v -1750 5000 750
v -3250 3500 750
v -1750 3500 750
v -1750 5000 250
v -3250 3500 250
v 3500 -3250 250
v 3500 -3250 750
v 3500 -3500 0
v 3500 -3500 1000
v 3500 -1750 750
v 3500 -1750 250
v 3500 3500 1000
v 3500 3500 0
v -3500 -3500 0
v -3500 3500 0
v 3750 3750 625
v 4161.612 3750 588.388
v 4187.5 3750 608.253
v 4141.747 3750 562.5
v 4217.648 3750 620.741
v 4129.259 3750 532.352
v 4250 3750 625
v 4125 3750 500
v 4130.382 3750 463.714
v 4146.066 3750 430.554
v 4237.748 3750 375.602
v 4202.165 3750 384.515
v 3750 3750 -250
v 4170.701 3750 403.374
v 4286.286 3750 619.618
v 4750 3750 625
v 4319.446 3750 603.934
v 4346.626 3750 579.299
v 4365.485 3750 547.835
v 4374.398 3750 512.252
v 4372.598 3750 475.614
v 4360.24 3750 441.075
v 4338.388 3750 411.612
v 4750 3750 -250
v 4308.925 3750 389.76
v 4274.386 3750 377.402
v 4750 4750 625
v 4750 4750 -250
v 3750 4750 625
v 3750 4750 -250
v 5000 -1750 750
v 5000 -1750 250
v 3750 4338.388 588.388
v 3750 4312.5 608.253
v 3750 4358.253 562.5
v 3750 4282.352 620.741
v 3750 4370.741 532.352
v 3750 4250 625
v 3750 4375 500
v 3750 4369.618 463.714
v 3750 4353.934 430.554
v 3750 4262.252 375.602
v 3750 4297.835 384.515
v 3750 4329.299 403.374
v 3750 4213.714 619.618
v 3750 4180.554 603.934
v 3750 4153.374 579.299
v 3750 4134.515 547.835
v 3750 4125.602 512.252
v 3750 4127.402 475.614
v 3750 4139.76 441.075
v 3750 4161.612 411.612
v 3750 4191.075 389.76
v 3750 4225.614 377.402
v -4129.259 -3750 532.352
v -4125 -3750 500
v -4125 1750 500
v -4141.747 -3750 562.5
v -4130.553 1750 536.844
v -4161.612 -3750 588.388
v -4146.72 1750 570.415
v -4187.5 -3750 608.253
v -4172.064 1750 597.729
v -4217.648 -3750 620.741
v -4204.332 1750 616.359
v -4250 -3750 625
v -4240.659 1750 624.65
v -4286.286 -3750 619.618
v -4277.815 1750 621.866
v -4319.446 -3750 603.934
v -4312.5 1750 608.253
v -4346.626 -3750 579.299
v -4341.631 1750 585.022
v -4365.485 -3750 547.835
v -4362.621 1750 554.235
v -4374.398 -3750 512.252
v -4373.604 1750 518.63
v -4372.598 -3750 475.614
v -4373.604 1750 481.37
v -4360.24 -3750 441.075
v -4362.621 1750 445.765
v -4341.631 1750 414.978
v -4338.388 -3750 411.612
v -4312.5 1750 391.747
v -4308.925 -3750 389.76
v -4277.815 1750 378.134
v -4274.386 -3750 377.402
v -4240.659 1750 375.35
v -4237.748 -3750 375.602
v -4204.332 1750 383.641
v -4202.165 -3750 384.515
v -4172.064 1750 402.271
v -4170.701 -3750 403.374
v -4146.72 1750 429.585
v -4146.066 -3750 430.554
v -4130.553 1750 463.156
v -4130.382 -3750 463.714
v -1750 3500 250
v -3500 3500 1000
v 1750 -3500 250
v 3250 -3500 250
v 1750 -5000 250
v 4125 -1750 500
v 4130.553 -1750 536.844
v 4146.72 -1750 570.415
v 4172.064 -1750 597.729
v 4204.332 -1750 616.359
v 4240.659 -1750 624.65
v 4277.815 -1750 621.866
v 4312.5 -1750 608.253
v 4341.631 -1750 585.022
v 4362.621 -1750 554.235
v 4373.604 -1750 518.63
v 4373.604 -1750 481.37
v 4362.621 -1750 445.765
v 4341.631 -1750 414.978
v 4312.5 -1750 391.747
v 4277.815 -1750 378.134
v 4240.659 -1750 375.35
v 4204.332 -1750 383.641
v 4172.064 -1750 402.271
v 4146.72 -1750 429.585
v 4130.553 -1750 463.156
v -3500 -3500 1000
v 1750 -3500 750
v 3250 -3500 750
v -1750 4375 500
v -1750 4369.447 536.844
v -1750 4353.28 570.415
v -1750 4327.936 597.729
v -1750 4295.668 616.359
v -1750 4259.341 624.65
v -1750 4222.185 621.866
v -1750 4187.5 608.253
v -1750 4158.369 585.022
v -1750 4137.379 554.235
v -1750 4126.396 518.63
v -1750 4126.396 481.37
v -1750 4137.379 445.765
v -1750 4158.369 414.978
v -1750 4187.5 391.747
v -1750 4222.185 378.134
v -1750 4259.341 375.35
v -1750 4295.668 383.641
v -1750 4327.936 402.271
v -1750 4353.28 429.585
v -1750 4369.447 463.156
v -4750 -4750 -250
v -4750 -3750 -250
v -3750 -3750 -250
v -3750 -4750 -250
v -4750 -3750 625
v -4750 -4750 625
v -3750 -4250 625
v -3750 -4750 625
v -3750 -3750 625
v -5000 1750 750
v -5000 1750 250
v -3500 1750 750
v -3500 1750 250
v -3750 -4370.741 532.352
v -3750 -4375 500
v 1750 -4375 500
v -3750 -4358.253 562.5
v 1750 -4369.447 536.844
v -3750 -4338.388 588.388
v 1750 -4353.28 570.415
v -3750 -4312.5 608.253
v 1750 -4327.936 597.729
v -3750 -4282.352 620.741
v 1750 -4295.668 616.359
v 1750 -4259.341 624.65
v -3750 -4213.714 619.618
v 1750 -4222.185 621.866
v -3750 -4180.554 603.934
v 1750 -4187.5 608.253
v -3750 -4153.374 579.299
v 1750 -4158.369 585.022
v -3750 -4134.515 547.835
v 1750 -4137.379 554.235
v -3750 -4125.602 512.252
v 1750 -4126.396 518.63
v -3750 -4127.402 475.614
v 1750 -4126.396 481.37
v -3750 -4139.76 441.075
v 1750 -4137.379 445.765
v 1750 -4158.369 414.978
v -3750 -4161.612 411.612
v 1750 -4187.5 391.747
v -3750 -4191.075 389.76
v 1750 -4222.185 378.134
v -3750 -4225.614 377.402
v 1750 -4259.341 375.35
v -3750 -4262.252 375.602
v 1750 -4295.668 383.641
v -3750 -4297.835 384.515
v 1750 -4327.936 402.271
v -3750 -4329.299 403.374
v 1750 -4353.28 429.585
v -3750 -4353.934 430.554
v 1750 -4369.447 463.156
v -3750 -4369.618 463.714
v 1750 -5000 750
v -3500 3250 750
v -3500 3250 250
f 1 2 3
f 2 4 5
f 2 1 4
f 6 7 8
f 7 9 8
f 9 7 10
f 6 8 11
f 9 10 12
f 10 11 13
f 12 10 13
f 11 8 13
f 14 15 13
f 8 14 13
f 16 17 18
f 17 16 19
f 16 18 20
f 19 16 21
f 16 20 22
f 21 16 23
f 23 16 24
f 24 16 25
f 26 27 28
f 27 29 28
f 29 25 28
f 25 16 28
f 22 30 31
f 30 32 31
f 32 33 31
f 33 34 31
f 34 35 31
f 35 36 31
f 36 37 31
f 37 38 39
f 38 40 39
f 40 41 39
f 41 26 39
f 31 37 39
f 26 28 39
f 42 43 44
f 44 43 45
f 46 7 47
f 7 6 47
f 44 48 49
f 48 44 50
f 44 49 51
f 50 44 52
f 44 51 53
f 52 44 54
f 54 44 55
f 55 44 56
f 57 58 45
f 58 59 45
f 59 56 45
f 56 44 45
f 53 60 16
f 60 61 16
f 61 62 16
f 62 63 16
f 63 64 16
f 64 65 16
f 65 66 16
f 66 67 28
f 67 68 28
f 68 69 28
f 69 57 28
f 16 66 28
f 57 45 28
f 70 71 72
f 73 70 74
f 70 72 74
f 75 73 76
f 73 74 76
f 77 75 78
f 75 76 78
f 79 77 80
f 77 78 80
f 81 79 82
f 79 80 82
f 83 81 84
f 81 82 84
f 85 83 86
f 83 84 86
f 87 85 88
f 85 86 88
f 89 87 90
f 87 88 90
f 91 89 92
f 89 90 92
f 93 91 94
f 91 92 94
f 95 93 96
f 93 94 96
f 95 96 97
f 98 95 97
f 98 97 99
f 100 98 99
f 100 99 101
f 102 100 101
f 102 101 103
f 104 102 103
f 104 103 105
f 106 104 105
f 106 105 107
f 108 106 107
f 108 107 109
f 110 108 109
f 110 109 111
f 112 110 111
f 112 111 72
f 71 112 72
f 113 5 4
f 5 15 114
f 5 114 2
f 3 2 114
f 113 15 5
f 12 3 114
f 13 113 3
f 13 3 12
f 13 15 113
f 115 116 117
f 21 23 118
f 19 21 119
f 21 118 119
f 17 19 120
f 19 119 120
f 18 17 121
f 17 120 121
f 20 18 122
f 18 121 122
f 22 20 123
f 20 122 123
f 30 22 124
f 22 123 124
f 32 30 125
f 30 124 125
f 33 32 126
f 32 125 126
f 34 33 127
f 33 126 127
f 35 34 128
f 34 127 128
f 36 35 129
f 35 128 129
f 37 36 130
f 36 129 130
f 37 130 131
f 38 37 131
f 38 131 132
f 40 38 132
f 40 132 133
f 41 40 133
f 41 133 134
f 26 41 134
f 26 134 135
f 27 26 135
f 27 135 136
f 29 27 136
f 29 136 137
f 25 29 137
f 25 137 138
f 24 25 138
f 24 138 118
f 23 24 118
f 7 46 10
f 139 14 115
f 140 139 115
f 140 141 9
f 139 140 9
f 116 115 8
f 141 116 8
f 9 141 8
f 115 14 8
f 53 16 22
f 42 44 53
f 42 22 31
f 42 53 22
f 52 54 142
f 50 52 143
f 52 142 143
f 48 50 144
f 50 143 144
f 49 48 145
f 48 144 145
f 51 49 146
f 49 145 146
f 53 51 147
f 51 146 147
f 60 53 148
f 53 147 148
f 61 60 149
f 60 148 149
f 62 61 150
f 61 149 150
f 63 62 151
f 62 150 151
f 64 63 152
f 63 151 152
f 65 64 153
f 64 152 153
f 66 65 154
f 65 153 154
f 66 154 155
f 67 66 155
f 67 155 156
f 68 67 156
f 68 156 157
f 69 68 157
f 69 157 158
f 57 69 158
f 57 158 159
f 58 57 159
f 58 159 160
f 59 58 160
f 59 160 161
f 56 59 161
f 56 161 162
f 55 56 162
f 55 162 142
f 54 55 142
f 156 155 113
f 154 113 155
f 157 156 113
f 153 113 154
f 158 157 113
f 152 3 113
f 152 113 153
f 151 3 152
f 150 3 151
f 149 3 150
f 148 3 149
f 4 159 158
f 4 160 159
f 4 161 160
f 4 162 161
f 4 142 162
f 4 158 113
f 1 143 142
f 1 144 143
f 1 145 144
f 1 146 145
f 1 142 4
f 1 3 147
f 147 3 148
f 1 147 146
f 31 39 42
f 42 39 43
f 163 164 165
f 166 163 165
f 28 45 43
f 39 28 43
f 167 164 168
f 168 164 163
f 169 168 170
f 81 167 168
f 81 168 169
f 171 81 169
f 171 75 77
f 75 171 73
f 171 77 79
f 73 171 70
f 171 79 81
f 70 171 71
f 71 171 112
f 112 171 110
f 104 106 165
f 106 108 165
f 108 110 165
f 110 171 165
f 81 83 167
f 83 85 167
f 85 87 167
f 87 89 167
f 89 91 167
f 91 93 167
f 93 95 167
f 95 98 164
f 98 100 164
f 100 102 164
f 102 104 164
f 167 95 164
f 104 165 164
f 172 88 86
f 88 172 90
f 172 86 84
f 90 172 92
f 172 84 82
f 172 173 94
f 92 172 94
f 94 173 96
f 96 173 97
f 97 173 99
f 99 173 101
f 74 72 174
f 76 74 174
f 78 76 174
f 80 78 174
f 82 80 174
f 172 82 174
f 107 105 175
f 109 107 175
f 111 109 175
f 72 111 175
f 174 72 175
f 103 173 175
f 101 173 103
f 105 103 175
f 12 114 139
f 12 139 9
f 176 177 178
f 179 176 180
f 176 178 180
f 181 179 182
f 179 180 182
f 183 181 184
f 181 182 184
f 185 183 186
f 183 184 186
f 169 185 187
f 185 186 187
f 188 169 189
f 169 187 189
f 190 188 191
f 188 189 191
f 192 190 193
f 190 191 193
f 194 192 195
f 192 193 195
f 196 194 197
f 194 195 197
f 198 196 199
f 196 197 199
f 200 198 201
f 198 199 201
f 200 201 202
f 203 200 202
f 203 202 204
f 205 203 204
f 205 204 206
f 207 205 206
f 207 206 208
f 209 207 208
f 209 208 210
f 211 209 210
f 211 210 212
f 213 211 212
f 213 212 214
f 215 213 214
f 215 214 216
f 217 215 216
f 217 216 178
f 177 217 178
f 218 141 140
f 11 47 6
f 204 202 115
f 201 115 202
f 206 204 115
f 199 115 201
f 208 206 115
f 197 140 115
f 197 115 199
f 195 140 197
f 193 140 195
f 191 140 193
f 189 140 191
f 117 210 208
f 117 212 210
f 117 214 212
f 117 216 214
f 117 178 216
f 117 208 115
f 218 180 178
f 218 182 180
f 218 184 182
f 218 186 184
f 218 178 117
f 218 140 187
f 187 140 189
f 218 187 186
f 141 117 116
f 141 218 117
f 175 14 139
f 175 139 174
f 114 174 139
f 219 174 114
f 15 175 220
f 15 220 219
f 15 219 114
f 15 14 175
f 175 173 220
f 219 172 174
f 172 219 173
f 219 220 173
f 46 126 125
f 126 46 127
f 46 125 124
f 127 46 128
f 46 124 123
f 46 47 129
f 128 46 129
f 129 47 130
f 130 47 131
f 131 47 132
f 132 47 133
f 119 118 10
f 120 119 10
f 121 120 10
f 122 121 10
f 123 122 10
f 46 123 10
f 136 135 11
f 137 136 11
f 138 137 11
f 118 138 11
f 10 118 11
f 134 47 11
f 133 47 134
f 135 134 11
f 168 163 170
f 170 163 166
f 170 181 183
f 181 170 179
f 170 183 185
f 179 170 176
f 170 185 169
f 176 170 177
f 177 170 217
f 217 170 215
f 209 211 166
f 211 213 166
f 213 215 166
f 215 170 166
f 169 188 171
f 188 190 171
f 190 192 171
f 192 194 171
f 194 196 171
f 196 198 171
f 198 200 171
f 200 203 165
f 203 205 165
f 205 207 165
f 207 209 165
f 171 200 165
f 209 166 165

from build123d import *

# Parameters (mm, degrees)
F0_W          = 7000
F0_H          = 7000
F1_DEPTH      = 1000
F4_DEPTH      = 250
F5_DEPTH      = 750
F5_DEPTH_BACK = 125
F6_R          = 125
F7_DEPTH      = 5500
F8_R          = 125
F9_DEPTH      = 5500
F12_COUNT     = 2


with BuildPart() as f1:
    # F0 (on Top) → F1 (new body)
    with BuildSketch(Plane.XY):
        Rectangle(F0_W, F0_H)
    extrude(amount=F1_DEPTH)

    # F3 (on offset) → F4 (join, symmetric)
    with BuildSketch(Plane.XY.offset(500)):
        Polygon((-4250, 1750), (-3500, 1750), (-3500, 3250), (-5000, 1750), align=None)
        Polygon((-3250, 3500), (-1750, 3500), (-1750, 4250), (-1750, 5000), align=None)
    extrude(amount=F4_DEPTH, both=True)



with BuildPart() as f5:
    # F3 (on offset) → F5 (new body, two sides)
    with BuildSketch(Plane.XY.offset(500)) as f5_sk:
        Polygon((-3750, -3750), (-4250, -3750), (-4750, -3750), (-4750, -4750), (-3750, -4750), align=None)
    extrude(amount=-F5_DEPTH)
    extrude(f5_sk.sketch, amount=F5_DEPTH_BACK)


with BuildPart() as f5b:
    # F3 (on offset) → F5, piece 2 (new body, two sides)
    with BuildSketch(Plane.XY.offset(500)) as f5_2_sk:
        Polygon((3750, 4750), (3750, 4250), (3750, 3750), (4750, 3750), (4750, 4750), align=None)
    extrude(amount=-F5_DEPTH)
    extrude(f5_2_sk.sketch, amount=F5_DEPTH_BACK)


with BuildPart() as f1_1:
    add(f1.part)

    add(f5.part)  # F7 merges F5
    # F6 (on face) → F7 (join, through all)
    with BuildSketch(Plane.XZ.offset(-1750)):
        with Locations((-4250, 500)):
            Circle(F6_R)
    extrude(amount=F7_DEPTH)


    add(f5b.part)  # F9 merges F5b
    # F8 (on face) → F9 (join, through all)
    with BuildSketch(Plane.YZ.offset(-1750)):
        with Locations((4250, 500)):
            Circle(F8_R)
    extrude(amount=F9_DEPTH)

    # F12: F1 ×2 about axis
    f12_axis = Axis((0, 0, 500), (0, 0, 1))


with BuildPart() as f1_2:
    add(f1_1.part)
    for i in range(1, F12_COUNT):
        add(f1_1.part.rotate(f12_axis, i * 360 / F12_COUNT))


solid = f1_2.part
